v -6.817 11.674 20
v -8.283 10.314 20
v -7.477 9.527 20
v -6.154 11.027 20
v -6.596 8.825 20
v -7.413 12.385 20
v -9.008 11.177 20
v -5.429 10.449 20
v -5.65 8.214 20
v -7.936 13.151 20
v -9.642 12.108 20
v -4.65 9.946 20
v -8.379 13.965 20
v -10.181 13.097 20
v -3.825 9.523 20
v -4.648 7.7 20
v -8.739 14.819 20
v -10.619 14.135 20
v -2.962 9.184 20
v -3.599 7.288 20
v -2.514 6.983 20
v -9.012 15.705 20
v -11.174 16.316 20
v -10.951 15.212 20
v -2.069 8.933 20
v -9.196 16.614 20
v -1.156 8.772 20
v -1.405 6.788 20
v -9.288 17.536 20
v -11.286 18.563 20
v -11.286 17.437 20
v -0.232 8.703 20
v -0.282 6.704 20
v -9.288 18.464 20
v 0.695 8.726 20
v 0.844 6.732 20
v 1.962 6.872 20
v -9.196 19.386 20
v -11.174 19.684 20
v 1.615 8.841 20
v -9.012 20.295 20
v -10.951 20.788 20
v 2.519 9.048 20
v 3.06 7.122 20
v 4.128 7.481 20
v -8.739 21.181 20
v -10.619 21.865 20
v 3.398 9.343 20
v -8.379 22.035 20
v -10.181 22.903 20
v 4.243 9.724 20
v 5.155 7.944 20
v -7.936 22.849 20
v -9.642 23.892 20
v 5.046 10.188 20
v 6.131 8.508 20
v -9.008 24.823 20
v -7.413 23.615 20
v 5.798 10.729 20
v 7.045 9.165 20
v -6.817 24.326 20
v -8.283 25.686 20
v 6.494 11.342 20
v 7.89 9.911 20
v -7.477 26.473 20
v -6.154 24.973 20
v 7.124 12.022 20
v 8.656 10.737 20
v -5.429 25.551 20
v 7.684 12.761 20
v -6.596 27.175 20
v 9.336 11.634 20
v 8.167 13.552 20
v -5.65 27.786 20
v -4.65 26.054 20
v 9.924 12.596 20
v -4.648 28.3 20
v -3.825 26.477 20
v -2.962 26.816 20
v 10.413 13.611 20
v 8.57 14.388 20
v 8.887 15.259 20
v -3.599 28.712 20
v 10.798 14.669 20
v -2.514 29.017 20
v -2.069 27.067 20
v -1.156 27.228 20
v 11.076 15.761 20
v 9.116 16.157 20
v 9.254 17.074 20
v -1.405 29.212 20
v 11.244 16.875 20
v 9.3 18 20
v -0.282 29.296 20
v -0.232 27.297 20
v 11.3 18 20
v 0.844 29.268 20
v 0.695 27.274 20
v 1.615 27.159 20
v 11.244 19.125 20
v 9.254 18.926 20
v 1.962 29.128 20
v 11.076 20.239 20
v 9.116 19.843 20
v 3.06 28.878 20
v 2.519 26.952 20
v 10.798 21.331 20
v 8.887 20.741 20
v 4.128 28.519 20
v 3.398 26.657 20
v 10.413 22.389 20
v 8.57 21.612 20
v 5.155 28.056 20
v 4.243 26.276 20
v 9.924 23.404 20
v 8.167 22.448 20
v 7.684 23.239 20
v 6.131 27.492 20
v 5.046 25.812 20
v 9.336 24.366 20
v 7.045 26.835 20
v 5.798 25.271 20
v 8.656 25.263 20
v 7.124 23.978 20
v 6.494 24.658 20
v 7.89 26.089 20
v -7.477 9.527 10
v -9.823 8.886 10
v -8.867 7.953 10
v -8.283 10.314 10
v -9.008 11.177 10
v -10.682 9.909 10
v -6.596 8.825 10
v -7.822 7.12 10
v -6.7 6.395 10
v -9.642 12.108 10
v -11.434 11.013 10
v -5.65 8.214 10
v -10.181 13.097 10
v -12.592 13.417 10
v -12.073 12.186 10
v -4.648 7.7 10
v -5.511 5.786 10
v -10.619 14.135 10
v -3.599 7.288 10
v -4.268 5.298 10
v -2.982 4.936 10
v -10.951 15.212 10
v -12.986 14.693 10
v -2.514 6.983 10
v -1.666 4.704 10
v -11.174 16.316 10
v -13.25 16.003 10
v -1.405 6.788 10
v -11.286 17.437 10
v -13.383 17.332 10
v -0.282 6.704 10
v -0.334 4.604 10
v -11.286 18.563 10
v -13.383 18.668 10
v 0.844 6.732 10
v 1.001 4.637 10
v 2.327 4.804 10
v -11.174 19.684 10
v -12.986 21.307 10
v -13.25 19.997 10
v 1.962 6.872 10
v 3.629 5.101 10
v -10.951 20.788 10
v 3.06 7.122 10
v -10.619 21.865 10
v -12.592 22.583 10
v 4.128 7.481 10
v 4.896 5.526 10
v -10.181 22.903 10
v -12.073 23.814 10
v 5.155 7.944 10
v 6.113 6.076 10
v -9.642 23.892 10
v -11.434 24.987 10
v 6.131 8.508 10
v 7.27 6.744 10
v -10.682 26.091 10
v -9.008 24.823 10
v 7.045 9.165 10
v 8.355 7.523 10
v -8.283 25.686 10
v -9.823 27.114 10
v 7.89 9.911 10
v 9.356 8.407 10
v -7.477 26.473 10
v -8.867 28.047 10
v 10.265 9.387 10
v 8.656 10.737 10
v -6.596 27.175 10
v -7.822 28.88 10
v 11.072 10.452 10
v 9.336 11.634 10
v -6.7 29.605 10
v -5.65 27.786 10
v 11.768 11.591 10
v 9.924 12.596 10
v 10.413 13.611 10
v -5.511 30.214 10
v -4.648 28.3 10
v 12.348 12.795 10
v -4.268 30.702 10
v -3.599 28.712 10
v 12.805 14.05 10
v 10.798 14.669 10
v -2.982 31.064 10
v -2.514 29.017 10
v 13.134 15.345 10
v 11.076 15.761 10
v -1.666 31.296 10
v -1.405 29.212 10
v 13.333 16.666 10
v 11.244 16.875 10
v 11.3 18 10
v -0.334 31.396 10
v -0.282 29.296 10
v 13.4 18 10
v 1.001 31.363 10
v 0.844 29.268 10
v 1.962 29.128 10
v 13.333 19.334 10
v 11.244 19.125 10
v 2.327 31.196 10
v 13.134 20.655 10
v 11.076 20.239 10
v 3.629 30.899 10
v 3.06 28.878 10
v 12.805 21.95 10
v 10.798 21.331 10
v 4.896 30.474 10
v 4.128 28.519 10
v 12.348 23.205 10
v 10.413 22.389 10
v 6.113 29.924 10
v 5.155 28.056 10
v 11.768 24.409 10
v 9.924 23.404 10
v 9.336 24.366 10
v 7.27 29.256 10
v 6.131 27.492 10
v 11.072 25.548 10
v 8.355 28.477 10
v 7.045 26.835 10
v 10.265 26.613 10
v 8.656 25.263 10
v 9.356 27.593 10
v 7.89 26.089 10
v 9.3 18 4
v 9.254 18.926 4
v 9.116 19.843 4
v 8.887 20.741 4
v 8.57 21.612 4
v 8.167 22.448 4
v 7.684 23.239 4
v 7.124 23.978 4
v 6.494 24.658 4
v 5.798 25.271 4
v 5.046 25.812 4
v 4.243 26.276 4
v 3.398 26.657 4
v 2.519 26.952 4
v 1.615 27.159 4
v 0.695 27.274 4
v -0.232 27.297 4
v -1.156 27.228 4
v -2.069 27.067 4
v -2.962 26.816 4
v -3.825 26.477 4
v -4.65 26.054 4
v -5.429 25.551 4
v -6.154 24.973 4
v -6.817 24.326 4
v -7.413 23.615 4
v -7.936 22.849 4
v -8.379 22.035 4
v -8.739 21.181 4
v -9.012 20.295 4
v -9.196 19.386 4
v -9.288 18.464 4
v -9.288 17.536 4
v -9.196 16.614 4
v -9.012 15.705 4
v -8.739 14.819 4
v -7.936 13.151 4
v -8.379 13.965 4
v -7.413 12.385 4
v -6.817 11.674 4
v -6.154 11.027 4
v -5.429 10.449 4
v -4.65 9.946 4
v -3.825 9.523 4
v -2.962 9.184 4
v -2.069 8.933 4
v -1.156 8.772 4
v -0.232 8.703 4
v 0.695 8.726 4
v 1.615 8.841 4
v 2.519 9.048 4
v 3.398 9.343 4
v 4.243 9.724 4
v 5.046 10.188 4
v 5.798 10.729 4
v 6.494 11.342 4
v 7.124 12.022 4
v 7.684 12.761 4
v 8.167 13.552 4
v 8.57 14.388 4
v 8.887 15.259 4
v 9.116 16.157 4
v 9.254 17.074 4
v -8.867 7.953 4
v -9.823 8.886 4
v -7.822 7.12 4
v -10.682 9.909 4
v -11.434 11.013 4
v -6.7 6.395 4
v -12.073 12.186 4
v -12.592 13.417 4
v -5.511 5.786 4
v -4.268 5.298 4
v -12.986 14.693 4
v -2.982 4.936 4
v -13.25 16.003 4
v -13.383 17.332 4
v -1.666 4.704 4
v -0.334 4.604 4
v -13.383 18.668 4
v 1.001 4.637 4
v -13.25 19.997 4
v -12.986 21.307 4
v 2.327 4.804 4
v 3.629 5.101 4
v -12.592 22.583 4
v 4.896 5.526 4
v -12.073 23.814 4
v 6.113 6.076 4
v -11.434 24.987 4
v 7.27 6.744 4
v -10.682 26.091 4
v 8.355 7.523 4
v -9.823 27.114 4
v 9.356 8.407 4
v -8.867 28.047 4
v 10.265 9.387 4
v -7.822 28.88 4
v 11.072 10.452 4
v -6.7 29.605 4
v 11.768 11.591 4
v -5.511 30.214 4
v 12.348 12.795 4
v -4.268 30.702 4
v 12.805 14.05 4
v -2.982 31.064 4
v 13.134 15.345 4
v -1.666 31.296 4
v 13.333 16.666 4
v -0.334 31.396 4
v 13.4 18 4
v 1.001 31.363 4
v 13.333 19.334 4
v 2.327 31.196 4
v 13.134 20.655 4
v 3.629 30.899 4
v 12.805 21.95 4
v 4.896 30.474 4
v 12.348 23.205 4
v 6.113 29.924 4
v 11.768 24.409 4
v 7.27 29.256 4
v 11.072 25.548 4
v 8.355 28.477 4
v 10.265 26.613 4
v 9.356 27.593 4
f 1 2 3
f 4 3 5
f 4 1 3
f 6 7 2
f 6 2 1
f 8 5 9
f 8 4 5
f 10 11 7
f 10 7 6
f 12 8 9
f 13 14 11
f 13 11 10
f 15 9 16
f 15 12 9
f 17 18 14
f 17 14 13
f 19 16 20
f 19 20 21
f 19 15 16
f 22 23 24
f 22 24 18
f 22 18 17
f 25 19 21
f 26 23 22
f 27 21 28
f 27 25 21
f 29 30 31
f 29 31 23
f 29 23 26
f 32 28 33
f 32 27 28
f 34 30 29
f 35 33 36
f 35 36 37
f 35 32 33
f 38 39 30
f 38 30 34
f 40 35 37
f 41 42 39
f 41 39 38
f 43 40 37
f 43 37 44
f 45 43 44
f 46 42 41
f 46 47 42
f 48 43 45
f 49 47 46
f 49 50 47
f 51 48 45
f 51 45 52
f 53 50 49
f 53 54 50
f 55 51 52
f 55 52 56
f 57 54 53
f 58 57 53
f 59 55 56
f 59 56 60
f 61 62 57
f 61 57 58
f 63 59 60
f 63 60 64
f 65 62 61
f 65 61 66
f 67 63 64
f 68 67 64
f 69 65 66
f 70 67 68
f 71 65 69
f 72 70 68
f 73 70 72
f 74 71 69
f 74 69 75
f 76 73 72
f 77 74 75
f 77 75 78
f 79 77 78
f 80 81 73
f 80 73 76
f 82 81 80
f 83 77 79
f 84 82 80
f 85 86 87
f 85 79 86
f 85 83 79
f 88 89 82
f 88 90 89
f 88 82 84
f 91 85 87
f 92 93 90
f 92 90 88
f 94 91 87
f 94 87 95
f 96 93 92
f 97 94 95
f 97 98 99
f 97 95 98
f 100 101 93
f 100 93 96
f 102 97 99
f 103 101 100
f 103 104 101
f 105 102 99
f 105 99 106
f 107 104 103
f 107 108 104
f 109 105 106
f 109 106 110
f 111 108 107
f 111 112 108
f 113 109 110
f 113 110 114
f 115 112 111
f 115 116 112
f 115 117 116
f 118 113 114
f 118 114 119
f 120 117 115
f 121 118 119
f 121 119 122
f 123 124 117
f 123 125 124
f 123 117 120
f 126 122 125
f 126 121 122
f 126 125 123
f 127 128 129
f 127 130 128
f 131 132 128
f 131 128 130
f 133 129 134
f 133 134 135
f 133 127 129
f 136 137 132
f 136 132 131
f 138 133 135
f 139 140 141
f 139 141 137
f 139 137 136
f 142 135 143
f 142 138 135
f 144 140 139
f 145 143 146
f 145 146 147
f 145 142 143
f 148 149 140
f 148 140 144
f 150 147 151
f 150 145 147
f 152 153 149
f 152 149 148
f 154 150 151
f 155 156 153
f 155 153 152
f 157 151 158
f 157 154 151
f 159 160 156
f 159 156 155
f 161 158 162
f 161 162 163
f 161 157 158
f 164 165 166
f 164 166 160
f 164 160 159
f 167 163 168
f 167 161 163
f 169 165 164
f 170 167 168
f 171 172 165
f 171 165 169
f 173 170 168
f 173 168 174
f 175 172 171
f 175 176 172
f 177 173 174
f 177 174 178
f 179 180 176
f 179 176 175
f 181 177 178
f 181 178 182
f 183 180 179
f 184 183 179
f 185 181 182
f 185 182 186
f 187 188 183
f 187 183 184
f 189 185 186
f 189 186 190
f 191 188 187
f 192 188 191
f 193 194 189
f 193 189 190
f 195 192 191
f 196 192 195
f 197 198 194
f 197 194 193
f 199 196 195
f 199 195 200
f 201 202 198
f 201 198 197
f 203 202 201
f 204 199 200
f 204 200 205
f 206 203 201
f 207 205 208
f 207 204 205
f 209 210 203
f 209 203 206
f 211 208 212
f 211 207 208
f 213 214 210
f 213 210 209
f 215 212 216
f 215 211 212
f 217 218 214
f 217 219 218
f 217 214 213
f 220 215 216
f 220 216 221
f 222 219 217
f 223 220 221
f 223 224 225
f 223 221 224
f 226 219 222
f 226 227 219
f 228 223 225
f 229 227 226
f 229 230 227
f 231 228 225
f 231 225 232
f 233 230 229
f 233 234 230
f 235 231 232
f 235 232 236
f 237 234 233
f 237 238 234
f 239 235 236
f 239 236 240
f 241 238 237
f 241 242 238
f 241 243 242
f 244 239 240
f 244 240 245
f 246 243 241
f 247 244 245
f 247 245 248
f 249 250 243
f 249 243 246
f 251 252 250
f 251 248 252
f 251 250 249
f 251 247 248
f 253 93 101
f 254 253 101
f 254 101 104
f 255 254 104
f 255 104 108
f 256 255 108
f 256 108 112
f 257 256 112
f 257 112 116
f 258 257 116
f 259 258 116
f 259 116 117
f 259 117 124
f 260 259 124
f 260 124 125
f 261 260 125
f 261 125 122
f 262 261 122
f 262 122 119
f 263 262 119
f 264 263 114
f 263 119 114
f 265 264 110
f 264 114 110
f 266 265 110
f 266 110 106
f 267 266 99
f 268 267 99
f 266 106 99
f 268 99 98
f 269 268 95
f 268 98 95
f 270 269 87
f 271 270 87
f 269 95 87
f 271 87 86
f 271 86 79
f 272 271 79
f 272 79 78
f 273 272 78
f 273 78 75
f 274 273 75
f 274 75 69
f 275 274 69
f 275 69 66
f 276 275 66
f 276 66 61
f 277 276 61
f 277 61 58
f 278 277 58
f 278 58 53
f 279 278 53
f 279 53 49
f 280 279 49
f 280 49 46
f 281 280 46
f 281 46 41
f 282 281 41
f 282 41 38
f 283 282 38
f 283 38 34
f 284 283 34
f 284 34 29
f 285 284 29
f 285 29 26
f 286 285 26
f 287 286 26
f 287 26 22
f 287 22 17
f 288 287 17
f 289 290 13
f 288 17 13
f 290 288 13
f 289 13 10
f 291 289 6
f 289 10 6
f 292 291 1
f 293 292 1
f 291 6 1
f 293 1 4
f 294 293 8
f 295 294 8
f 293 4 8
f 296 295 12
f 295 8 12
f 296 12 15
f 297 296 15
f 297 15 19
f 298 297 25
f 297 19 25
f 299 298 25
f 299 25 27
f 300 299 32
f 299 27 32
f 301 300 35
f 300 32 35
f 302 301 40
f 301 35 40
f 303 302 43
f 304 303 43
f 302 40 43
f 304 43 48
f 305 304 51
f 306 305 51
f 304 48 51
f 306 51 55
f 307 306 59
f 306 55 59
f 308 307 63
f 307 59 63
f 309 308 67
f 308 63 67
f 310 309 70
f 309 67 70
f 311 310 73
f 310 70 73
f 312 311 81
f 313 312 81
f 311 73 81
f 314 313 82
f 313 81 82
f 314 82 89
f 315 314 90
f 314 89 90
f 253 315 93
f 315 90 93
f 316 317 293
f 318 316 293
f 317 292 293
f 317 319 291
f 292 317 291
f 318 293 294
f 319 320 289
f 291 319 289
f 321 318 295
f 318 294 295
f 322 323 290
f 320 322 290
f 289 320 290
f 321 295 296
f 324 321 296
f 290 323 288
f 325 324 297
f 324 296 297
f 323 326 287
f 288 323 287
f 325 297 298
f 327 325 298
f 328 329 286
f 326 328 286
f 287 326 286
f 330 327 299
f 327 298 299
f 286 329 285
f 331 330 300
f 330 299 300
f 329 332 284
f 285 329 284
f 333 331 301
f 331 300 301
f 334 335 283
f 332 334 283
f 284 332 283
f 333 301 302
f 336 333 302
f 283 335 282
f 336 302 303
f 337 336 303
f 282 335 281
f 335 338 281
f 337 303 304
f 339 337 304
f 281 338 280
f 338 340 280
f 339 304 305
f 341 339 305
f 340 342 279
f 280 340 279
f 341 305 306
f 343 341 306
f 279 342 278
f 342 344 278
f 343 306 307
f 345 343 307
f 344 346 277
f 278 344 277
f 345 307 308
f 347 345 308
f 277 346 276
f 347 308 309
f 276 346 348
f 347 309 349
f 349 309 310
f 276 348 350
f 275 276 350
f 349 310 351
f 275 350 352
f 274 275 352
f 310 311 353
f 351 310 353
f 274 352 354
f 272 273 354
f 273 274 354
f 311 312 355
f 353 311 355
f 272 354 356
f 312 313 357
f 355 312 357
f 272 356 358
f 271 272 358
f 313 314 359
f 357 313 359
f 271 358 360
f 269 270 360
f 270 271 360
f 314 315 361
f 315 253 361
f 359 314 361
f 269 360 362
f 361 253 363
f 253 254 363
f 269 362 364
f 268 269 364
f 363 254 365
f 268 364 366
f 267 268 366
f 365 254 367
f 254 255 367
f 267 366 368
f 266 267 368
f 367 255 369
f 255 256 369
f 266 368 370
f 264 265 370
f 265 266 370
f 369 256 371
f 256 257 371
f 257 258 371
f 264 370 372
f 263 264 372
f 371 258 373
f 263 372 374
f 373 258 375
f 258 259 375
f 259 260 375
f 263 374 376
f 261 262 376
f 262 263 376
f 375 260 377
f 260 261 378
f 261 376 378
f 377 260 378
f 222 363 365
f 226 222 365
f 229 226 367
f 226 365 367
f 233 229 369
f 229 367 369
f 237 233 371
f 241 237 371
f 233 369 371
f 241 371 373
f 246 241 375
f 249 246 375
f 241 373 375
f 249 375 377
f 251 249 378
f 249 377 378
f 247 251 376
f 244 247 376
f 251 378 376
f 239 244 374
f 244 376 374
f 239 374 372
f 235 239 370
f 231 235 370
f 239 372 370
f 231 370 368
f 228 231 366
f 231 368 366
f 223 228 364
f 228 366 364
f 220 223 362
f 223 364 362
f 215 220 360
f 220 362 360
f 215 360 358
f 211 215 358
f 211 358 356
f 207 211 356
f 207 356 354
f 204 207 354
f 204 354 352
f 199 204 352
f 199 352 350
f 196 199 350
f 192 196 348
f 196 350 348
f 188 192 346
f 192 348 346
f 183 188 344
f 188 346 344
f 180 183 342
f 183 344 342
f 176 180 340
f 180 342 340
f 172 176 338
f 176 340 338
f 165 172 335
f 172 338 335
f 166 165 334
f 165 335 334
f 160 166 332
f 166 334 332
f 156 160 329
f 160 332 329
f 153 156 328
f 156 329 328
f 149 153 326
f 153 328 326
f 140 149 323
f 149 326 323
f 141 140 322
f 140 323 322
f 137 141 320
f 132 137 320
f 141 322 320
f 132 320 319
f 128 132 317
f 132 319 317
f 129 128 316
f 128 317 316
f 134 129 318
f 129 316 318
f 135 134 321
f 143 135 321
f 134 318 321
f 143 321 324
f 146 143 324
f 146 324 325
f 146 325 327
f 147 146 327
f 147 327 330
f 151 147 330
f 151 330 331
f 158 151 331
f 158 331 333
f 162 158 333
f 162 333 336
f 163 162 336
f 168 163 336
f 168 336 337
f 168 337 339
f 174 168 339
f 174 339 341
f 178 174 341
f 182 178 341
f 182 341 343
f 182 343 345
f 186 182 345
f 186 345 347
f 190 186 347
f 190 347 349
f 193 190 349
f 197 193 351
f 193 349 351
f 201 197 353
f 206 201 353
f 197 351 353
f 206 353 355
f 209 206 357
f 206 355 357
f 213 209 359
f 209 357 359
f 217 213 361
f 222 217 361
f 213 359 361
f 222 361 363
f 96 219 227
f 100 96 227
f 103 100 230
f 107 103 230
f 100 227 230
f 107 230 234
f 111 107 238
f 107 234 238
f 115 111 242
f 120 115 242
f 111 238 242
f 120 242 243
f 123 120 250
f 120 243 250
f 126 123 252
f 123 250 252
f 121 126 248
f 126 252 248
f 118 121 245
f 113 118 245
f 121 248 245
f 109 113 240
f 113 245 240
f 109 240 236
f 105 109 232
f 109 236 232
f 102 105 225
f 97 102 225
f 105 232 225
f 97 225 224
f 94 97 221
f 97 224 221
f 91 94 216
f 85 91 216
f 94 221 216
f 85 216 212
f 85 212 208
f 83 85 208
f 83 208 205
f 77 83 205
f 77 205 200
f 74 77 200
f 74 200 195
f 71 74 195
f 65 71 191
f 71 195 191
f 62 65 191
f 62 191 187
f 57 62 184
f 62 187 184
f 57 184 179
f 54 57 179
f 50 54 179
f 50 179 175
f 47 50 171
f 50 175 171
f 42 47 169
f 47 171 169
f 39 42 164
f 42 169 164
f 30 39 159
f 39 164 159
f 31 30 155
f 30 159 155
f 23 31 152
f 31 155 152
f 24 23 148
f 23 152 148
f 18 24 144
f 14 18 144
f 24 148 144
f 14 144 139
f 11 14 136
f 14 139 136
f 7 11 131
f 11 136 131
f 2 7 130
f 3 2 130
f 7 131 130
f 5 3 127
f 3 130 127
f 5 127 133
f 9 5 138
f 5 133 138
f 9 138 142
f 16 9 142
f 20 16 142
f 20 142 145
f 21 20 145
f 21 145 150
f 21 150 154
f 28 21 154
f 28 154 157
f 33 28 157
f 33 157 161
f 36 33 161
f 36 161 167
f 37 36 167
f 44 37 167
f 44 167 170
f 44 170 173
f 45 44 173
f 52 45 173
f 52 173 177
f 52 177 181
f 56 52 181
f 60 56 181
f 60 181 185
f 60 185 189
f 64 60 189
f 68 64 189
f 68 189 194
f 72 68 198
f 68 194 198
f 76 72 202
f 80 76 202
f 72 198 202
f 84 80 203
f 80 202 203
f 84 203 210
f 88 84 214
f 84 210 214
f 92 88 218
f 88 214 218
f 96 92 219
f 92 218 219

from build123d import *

# Parameters (mm, degrees)
SKETCH029_R     = 13.4
PAD020_DEPTH    = 6
SKETCH030_R     = 11.3
PAD021_DEPTH    = 10
SKETCH031_R     = 9.3
POCKET008_DEPTH = 16.001


with BuildPart() as part:
    # Sketch029 → Pad020 (new body)
    with BuildSketch(Plane.XY):
        with Locations((0, 18)):
            Circle(SKETCH029_R)
    extrude(amount=PAD020_DEPTH)

    # Sketch030 (on Face3 of Pad020) → Pad021 (join)
    with BuildSketch(Plane.XY.offset(6)):
        with Locations((0, 18)):
            Circle(SKETCH030_R)
    extrude(amount=PAD021_DEPTH)

    # Sketch031 (on Face5 of Pad021) → Pocket008 (cut, through all)
    with BuildSketch(Plane.XY.offset(16)):
        with Locations((0, 18)):
            Circle(SKETCH031_R)
    extrude(amount=-POCKET008_DEPTH, mode=Mode.SUBTRACT)


with BuildPart() as part_1:
    # Body038 placement: moved
    add(part.part.moved(Location((0, 0, 4))))


solid = part_1.part
